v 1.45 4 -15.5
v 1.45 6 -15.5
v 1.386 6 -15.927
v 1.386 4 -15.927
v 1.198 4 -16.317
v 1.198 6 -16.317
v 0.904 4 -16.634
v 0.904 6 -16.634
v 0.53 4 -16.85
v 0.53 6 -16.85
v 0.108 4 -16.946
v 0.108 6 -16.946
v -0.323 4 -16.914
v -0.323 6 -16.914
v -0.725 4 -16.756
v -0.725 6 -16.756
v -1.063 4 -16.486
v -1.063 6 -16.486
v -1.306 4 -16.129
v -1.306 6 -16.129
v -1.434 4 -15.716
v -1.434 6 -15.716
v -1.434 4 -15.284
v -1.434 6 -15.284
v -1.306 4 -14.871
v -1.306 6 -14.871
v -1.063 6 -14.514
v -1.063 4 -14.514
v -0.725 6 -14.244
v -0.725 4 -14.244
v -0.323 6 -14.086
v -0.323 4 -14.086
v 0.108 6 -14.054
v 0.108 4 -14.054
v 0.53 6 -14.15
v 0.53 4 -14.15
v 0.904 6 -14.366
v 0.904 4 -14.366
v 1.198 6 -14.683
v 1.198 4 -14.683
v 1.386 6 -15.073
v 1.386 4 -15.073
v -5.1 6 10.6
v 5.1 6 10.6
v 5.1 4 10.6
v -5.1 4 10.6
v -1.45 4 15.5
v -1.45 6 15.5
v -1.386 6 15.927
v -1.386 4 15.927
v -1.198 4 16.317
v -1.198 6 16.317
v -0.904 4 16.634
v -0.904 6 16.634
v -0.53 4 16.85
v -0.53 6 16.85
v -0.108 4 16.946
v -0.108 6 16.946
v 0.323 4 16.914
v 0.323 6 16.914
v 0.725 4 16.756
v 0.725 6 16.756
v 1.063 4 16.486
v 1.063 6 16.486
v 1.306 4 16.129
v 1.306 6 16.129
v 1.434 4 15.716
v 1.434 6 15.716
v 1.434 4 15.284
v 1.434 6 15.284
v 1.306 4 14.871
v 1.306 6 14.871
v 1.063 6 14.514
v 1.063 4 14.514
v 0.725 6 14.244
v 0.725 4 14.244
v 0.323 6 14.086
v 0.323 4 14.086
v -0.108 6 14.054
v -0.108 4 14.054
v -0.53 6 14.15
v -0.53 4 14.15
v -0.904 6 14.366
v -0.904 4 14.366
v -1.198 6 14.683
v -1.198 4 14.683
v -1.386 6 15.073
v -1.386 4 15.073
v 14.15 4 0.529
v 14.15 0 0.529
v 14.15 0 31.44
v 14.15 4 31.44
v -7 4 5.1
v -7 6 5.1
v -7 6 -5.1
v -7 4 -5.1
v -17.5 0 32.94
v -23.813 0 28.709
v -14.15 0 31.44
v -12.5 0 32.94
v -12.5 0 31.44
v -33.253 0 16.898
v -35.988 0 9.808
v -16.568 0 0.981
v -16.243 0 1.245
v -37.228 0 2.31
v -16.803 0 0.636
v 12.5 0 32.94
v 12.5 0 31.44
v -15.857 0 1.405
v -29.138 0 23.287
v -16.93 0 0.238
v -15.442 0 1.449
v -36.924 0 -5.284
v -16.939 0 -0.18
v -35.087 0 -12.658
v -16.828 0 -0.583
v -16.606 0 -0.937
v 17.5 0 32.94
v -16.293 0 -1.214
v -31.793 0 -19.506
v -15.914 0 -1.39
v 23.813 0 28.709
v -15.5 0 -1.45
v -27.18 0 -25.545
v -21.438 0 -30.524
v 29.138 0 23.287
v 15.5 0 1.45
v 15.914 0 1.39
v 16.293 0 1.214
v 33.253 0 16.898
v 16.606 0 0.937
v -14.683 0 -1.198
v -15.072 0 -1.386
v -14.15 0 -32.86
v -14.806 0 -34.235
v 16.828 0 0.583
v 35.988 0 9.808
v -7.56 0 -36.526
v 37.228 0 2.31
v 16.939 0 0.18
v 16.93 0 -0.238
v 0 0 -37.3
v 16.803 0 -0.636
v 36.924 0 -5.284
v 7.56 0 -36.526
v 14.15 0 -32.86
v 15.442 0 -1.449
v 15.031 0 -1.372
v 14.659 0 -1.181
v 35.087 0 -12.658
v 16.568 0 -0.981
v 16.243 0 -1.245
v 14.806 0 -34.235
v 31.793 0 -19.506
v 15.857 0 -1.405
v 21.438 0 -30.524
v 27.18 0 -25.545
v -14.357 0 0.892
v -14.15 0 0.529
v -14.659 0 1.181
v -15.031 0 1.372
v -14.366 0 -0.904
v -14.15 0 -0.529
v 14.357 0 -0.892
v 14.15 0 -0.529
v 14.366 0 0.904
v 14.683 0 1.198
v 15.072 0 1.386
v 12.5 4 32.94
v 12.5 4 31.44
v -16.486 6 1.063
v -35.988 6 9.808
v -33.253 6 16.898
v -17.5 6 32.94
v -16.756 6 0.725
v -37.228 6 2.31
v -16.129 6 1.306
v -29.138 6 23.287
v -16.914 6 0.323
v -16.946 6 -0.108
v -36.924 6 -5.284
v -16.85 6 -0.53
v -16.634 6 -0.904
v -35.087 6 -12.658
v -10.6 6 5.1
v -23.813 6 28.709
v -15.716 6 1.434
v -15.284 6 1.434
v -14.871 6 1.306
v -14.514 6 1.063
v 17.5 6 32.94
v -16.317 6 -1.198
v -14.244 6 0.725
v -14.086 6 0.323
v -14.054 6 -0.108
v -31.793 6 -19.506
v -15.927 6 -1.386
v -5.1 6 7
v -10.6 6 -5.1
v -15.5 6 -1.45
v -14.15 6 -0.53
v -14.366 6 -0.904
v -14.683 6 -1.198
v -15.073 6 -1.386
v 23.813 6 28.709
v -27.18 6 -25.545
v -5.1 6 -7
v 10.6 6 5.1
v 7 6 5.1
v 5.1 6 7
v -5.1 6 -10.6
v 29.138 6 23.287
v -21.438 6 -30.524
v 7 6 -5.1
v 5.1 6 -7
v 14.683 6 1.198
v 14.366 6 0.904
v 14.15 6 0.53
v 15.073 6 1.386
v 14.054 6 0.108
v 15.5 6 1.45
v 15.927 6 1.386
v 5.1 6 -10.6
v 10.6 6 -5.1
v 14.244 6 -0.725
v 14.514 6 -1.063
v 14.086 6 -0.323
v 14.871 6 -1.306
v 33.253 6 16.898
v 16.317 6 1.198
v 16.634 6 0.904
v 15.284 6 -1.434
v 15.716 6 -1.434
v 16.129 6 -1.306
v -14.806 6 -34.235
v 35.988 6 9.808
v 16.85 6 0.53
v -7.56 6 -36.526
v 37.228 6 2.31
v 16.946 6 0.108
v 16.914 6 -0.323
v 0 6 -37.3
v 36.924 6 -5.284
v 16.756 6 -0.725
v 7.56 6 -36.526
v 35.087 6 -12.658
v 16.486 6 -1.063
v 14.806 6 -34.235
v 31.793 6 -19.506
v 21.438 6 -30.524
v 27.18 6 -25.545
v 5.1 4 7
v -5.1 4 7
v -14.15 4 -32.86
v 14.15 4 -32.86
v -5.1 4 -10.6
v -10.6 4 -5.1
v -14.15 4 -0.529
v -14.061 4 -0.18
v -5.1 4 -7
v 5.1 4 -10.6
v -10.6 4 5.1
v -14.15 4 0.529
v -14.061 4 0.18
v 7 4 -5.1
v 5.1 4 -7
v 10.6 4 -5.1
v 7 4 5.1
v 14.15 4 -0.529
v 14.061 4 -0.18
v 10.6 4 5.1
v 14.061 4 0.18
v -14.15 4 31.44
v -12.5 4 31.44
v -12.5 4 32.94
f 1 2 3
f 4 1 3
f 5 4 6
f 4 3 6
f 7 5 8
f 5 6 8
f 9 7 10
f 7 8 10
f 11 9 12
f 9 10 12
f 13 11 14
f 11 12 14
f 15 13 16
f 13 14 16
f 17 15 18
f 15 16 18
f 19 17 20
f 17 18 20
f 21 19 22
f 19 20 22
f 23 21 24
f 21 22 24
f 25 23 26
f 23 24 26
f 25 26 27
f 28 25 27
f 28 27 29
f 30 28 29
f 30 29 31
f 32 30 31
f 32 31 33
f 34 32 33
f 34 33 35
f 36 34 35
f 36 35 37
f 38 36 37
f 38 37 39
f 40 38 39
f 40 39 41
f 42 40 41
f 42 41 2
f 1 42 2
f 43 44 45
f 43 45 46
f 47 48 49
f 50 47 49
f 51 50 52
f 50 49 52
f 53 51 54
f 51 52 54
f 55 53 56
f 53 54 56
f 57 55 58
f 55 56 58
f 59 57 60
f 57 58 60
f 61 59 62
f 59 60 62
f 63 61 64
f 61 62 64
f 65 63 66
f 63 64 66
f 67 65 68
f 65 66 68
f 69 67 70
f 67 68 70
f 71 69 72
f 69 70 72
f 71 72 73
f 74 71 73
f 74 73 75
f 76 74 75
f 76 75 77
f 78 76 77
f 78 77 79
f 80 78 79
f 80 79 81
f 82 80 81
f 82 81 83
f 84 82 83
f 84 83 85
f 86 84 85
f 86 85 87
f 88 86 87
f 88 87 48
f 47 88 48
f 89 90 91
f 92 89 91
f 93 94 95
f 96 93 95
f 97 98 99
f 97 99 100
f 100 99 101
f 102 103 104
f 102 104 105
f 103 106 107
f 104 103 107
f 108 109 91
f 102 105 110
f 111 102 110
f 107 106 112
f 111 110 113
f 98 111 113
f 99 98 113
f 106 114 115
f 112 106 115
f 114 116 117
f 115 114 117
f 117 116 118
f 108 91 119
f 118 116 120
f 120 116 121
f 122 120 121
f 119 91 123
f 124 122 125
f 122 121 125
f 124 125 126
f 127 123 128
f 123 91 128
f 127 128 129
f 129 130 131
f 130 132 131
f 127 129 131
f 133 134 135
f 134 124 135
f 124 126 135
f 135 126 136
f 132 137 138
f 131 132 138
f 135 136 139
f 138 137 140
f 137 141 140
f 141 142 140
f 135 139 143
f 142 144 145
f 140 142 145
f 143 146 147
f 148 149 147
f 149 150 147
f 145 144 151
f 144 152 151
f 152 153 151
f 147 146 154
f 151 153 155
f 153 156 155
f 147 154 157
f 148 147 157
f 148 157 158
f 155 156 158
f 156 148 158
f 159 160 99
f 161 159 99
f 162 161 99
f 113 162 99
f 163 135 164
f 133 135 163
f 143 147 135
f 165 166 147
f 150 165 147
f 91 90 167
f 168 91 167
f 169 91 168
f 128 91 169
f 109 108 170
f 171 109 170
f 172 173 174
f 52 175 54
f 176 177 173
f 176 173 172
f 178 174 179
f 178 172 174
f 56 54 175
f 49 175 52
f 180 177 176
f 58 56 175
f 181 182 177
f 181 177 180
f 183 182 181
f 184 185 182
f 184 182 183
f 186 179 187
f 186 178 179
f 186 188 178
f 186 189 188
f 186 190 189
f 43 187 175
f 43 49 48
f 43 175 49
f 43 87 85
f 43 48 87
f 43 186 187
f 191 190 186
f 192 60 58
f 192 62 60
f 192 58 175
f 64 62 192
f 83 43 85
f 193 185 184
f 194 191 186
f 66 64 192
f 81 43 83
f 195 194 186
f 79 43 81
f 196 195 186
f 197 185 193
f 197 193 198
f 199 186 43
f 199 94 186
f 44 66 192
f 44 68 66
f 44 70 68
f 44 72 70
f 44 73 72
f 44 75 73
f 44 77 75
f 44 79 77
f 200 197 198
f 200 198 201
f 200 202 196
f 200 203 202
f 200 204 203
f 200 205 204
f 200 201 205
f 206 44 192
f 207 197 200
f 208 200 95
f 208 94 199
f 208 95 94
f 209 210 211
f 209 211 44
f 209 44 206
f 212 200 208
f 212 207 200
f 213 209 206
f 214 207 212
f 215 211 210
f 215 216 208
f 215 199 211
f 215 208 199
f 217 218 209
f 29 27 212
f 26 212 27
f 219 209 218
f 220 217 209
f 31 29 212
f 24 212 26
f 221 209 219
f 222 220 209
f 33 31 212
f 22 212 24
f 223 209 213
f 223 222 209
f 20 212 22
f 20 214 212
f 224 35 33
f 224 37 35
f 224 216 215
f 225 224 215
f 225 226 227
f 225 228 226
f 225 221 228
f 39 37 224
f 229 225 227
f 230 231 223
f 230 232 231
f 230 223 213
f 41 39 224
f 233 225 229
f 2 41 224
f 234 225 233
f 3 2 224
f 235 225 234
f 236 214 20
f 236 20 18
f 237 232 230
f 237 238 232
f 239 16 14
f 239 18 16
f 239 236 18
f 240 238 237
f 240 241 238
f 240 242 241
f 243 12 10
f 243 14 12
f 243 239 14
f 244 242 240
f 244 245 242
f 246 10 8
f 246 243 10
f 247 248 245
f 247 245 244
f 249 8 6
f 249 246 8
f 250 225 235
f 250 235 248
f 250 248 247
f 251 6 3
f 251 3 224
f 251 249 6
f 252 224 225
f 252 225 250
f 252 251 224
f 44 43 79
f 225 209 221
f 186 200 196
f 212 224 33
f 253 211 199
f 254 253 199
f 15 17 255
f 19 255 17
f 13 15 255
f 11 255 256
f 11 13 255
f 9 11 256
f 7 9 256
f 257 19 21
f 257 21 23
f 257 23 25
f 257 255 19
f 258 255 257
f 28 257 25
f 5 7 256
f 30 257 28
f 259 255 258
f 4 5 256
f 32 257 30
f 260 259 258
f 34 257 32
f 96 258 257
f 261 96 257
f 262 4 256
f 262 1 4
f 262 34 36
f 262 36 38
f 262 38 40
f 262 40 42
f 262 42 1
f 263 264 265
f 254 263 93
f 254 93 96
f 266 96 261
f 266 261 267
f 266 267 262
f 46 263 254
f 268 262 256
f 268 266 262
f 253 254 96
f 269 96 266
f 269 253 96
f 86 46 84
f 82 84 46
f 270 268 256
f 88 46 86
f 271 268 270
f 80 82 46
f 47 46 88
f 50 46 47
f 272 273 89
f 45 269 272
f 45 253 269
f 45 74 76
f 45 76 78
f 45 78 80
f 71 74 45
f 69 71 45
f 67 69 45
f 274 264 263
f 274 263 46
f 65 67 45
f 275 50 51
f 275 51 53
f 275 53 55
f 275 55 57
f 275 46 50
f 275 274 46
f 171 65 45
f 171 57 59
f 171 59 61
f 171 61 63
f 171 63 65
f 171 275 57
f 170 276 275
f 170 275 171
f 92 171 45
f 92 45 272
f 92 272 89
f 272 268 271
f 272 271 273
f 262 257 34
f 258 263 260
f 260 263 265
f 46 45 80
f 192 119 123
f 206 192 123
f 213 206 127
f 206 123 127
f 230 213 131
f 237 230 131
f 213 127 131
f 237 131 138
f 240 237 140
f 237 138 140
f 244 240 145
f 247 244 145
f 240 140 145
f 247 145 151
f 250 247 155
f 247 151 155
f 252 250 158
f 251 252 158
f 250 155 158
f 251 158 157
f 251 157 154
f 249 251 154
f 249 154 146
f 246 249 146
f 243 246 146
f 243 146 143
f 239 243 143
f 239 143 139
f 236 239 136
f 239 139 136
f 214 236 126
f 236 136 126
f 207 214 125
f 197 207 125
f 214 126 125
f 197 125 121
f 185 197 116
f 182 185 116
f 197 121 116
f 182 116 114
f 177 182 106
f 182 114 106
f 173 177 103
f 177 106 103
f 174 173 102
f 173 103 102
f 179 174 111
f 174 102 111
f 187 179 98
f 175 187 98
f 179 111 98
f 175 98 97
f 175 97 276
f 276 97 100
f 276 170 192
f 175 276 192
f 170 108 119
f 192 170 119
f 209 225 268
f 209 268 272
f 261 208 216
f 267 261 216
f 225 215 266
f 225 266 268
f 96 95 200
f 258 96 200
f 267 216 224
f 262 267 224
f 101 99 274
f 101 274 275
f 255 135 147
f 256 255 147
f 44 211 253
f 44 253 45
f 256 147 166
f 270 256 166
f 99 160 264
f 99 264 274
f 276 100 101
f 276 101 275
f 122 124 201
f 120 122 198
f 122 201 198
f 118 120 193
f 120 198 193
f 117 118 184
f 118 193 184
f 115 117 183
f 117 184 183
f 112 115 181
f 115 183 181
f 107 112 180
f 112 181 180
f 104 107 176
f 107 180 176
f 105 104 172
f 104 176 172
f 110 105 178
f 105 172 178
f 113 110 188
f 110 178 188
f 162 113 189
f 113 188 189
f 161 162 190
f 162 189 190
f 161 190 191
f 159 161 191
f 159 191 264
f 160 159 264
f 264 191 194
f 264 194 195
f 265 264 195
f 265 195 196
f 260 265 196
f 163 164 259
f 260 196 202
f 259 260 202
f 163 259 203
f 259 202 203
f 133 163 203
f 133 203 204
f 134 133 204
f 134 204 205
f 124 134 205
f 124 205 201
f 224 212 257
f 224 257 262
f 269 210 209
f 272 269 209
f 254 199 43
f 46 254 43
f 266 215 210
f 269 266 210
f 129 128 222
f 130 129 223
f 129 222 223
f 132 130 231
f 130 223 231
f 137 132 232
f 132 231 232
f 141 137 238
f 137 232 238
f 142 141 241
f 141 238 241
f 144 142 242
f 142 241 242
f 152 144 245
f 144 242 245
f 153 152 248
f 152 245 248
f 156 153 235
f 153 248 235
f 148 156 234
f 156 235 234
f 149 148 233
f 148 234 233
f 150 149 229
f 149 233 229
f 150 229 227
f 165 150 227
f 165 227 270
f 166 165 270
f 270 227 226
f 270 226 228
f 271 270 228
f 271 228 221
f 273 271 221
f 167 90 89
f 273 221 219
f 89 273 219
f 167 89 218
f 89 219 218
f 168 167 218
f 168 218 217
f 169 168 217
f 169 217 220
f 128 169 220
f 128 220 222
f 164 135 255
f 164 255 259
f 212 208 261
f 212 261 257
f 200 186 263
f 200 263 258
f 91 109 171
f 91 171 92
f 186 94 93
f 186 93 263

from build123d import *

# Parameters (mm, degrees)
BOSS_EXTRUDE1_DEPTH = 6
SKETCH2_W           = 28.3
SKETCH2_H           = 64.3
CUT_EXTRUDE1_DEPTH  = 4
SKETCH3_R           = 1.45
SKETCH3_W           = 10.2
SKETCH3_H           = 3.6
CUT_EXTRUDE2_DEPTH  = 7
CIRPATTERN1_COUNT   = 4
CUT_EXTRUDE3_REACH  = 72.24
SKETCH4_W           = 25
SKETCH4_H           = 4


with BuildPart() as part:
    # Sketch1 → Boss-Extrude1 (new body)
    with BuildSketch(Plane(origin=(0, 0, 0), x_dir=(1, 0, 0), z_dir=(0, 1, 0))):
        with BuildLine():
            Line((-17.5, -32.939945355), (17.5, -32.939945355))
            ThreePointArc((17.5, -32.939945355), (0, 37.3), (-17.5, -32.939945355))
        make_face()
    extrude(amount=BOSS_EXTRUDE1_DEPTH)

    # Sketch2 → Cut-Extrude1 (cut)
    with BuildSketch(Plane.XZ):
        with Locations((0, -0.710054645)):
            Rectangle(SKETCH2_W, SKETCH2_H)
    extrude(amount=-CUT_EXTRUDE1_DEPTH, mode=Mode.SUBTRACT)

    # Sketch3 → Cut-Extrude2 (cut, through all)
    with BuildSketch(Plane(origin=(0, 6, 0), x_dir=(1, 0, 0), z_dir=(0, 1, 0))):
        with Locations((0, 15.5)):
            Circle(SKETCH3_R)
        with Locations((0, 8.8)):
            Rectangle(SKETCH3_W, SKETCH3_H)
    cut_extrude2 = extrude(amount=-CUT_EXTRUDE2_DEPTH, mode=Mode.SUBTRACT)

    # CirPattern1: Cut-Extrude2 ×4 about axis
    cirpattern1_axis = Axis((0, 0, 0), (0, 1, 0))
    for i in range(1, CIRPATTERN1_COUNT):
        add(cut_extrude2.rotate(cirpattern1_axis, i * 360 / CIRPATTERN1_COUNT), mode=Mode.SUBTRACT)

    # Sketch4 → Cut-Extrude3 (cut, up to next)
    with BuildSketch(Plane.XY.offset(32.939945355), mode=Mode.PRIVATE) as cut_extrude3_sk1:
        with Locations((0, 2)):
            Rectangle(SKETCH4_W, SKETCH4_H)
    cut_extrude3_tool1 = extrude(cut_extrude3_sk1.sketch, amount=-CUT_EXTRUDE3_REACH, mode=Mode.PRIVATE) & part.part
    add(cut_extrude3_tool1.solids().sort_by_distance((0, 2, 32.939945))[0], mode=Mode.SUBTRACT)


solid = part.part
